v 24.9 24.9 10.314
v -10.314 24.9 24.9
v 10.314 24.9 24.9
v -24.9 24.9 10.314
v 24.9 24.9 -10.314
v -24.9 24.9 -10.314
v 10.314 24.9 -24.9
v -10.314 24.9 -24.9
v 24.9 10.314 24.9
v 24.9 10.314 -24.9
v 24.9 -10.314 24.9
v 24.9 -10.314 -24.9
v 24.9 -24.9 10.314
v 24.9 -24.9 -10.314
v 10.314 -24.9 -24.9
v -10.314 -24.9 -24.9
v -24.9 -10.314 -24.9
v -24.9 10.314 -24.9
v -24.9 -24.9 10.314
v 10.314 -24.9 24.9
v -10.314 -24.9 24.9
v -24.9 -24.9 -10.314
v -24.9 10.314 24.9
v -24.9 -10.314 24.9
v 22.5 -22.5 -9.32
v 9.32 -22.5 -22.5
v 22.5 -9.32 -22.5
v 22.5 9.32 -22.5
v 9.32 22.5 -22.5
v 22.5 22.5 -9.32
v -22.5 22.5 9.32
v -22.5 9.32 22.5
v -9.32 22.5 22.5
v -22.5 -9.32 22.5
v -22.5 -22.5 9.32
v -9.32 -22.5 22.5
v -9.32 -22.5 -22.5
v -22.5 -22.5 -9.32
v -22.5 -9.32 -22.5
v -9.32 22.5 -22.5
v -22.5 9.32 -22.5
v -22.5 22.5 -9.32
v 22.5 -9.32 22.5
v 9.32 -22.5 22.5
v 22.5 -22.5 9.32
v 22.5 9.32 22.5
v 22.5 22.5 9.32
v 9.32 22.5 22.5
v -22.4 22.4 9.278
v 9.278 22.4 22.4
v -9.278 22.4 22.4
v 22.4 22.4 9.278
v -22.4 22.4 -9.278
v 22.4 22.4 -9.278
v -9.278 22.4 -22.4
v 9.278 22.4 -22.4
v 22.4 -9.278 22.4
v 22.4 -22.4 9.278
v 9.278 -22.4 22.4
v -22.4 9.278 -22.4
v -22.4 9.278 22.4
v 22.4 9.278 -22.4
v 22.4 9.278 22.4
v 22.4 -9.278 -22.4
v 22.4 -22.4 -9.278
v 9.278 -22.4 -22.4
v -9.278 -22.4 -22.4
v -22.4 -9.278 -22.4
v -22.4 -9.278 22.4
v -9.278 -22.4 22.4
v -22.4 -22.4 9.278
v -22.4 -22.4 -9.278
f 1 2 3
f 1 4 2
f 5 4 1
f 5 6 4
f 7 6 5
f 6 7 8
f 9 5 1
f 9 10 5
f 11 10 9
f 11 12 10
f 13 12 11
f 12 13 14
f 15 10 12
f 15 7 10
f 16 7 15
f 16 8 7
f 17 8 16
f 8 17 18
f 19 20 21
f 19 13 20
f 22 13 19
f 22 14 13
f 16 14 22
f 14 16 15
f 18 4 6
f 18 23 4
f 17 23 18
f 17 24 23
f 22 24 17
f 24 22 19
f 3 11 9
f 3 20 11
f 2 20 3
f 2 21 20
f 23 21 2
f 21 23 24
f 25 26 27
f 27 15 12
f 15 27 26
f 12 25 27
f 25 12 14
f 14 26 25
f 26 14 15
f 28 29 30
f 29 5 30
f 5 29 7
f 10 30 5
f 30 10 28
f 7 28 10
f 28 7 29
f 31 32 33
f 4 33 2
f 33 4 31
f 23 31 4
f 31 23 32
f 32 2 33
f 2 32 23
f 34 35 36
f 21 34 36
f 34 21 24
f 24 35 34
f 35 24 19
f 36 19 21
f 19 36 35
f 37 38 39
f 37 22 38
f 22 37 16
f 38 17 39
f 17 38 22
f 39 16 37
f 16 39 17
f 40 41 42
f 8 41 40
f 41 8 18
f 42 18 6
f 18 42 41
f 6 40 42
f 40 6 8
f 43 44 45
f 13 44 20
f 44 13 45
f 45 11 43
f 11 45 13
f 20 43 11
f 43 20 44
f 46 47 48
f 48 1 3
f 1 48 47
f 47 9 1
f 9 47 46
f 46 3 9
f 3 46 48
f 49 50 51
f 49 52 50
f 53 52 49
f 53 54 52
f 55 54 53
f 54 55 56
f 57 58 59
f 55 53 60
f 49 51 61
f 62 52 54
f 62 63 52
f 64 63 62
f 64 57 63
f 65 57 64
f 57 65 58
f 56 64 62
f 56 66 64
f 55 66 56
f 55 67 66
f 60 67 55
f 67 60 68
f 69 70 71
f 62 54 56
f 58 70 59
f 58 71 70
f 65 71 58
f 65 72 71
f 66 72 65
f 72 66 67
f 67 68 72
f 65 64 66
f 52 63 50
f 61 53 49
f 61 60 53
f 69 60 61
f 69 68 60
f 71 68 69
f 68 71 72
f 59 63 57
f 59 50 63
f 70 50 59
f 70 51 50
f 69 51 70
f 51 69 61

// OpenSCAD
/*
 make space for triangles
*/
difference()
{
 scale(2.49)
 trunc_cube();


faces3();



scale(2.24)
trunc_cube();
}


module trunc_cube()
{

  /*
      truncated cube
     coordinates from Wikipedia
     triangles by pmoews
  */
polyhedron
       (points = [
                 [   4.14214,  10.00000,  10.00000],
                 [   4.14214, -10.00000,  10.00000],
                 [  -4.14214,  10.00000,  10.00000],
                 [  -4.14214, -10.00000,  10.00000],
                 [  10.00000,   4.14214,  10.00000],
                 [  10.00000,  -4.14214,  10.00000],
                 [ -10.00000,   4.14214,  10.00000],
                 [ -10.00000,  -4.14214,  10.00000],
                 [  10.00000,  10.00000,   4.14214],
                 [  10.00000, -10.00000,   4.14214],
                 [ -10.00000,  10.00000,   4.14214],
                 [ -10.00000, -10.00000,   4.14214],
                 [  10.00000,  10.00000,  -4.14214],
                 [  10.00000, -10.00000,  -4.14214],
                 [ -10.00000,  10.00000,  -4.14214],
                 [ -10.00000, -10.00000,  -4.14214],
                 [   4.14214,  10.00000, -10.00000],
                 [   4.14214, -10.00000, -10.00000],
                 [  -4.14214,  10.00000, -10.00000],
                 [  -4.14214, -10.00000, -10.00000],
                 [  10.00000,   4.14214, -10.00000],
                 [  10.00000,  -4.14214, -10.00000],
                 [ -10.00000,   4.14214, -10.00000],
                 [ -10.00000,  -4.14214, -10.00000],
                ],
           triangles = [
                 [    0,    6,    2],[    4,    6,    0],
                 [    5,    6,    4],[    1,    6,    5],
                 [    3,    6,    1],[    7,    6,    3],
                 [   22,   16,   18],[   20,   22,   21],
                 [   16,   22,   20],[   22,   17,   21],
                 [   22,   19,   17],[   22,   23,   19],
                 [    8,    5,    4],[   12,    5,    8],
                 [   20,    5,   12],[   21,    5,   20],
                 [   13,    5,   21],[   13,    9,    5],
                 [    7,   10,    6],[    7,   14,   10],
                 [    7,   22,   14],[    7,   23,   22],
                 [    7,   15,   23],[   11,   15,    7],
                 [    2,    8,    0],[    2,   12,    8],
                 [    2,   16,   12],[    2,   18,   16],
                 [    2,   14,   18],[   10,   14,    2],
                 [    9,    3,    1],[   13,    3,    9],
                 [   17,    3,   13],[   19,    3,   17],
                 [   15,    3,   19],[   15,   11,    3],
                 [    4,    0,    8],[    2,    6,   10],
                 [    7,    3,   11],[    1,    5,    9],
                 [   16,   20,   12],[   21,   17,   13],
                 [   22,   18,   14],[   19,   23,   15],
                 ]
      );

}


  module faces3()
{




/*
   truncated cube
     coordinates from Wolfram/alpha
     triangles by pmoews  triangular faces
*/
polyhedron
       (points = [
                 [  10.35534,  25.00000,  25.00000],
                 [  10.35534,  25.00000, -25.00000],
                 [  10.35534, -25.00000,  25.00000],
                 [  10.35534, -25.00000, -25.00000],
                 [ -10.35534,  25.00000,  25.00000],
                 [ -10.35534,  25.00000, -25.00000],
                 [ -10.35534, -25.00000,  25.00000],
                 [ -10.35534, -25.00000, -25.00000],
                 [  25.00000,  10.35534,  25.00000],
                 [  25.00000,  10.35534, -25.00000],
                 [  25.00000, -10.35534,  25.00000],
                 [  25.00000, -10.35534, -25.00000],
                 [ -25.00000,  10.35534,  25.00000],
                 [ -25.00000,  10.35534, -25.00000],
                 [ -25.00000, -10.35534,  25.00000],
                 [ -25.00000, -10.35534, -25.00000],
                 [  25.00000,  25.00000,  10.35534],
                 [  25.00000,  25.00000, -10.35534],
                 [  25.00000, -25.00000,  10.35534],
                 [  25.00000, -25.00000, -10.35534],
                 [ -25.00000,  25.00000,  10.35534],
                 [ -25.00000,  25.00000, -10.35534],
                 [ -25.00000, -25.00000,  10.35534],
                 [ -25.00000, -25.00000, -10.35534],
                 [   9.31980,  22.50000,  22.50000],
                 [   9.31980,  22.50000, -22.50000],
                 [   9.31980, -22.50000,  22.50000],
                 [   9.31980, -22.50000, -22.50000],
                 [  -9.31980,  22.50000,  22.50000],
                 [  -9.31980,  22.50000, -22.50000],
                 [  -9.31980, -22.50000,  22.50000],
                 [  -9.31980, -22.50000, -22.50000],
                 [  22.50000,   9.31980,  22.50000],
                 [  22.50000,   9.31980, -22.50000],
                 [  22.50000,  -9.31980,  22.50000],
                 [  22.50000,  -9.31980, -22.50000],
                 [ -22.50000,   9.31980,  22.50000],
                 [ -22.50000,   9.31980, -22.50000],
                 [ -22.50000,  -9.31980,  22.50000],
                 [ -22.50000,  -9.31980, -22.50000],
                 [  22.50000,  22.50000,   9.31980],
                 [  22.50000,  22.50000,  -9.31980],
                 [  22.50000, -22.50000,   9.31980],
                 [  22.50000, -22.50000,  -9.31980],
                 [ -22.50000,  22.50000,   9.31980],
                 [ -22.50000,  22.50000,  -9.31980],
                 [ -22.50000, -22.50000,   9.31980],
                 [ -22.50000, -22.50000,  -9.31980],
                ],
           triangles = [
                 [   27,   35,   43],[   11,    3,   19],
                 [   27,    3,   11],[   11,   35,   27],
                 [   35,   11,   19],[   19,   43,   35],
                 [   43,   19,    3],[   27,   43,    3],
                 [   25,   41,   33],[   17,    1,    9],
                 [   25,    1,   17],[   17,   41,   25],
                 [   41,   17,    9],[    9,   33,   41],
                 [   33,    9,    1],[   25,   33,    1],
                 [   28,   44,   36],[   20,    4,   12],
                 [   28,    4,   20],[   20,   44,   28],
                 [   44,   20,   12],[   12,   36,   44],
                 [   36,   12,    4],[   28,   36,    4],
                 [   30,   38,   46],[   14,    6,   22],
                 [   30,    6,   14],[   14,   38,   30],
                 [   38,   14,   22],[   22,   46,   38],
                 [   46,   22,    6],[   30,   46,    6],
                 [   31,   47,   39],[   23,    7,   15],
                 [   31,    7,   23],[   23,   47,   31],
                 [   47,   23,   15],[   15,   39,   47],
                 [   39,   15,    7],[   31,   39,    7],
                 [   29,   37,   45],[   13,    5,   21],
                 [   29,    5,   13],[   13,   37,   29],
                 [   37,   13,   21],[   21,   45,   37],
                 [   45,   21,    5],[   29,   45,    5],
                 [   26,   42,   34],[   18,    2,   10],
                 [   26,    2,   18],[   18,   42,   26],
                 [   42,   18,   10],[   10,   34,   42],
                 [   34,   10,    2],[   26,   34,    2],
                 [   24,   40,   32],[   16,    0,    8],
                 [   24,    0,   16],[   16,   40,   24],
                 [   40,   16,    8],[    8,   32,   40],
                 [   32,    8,    0],[   24,   32,    0],
                 ]
      );

}
